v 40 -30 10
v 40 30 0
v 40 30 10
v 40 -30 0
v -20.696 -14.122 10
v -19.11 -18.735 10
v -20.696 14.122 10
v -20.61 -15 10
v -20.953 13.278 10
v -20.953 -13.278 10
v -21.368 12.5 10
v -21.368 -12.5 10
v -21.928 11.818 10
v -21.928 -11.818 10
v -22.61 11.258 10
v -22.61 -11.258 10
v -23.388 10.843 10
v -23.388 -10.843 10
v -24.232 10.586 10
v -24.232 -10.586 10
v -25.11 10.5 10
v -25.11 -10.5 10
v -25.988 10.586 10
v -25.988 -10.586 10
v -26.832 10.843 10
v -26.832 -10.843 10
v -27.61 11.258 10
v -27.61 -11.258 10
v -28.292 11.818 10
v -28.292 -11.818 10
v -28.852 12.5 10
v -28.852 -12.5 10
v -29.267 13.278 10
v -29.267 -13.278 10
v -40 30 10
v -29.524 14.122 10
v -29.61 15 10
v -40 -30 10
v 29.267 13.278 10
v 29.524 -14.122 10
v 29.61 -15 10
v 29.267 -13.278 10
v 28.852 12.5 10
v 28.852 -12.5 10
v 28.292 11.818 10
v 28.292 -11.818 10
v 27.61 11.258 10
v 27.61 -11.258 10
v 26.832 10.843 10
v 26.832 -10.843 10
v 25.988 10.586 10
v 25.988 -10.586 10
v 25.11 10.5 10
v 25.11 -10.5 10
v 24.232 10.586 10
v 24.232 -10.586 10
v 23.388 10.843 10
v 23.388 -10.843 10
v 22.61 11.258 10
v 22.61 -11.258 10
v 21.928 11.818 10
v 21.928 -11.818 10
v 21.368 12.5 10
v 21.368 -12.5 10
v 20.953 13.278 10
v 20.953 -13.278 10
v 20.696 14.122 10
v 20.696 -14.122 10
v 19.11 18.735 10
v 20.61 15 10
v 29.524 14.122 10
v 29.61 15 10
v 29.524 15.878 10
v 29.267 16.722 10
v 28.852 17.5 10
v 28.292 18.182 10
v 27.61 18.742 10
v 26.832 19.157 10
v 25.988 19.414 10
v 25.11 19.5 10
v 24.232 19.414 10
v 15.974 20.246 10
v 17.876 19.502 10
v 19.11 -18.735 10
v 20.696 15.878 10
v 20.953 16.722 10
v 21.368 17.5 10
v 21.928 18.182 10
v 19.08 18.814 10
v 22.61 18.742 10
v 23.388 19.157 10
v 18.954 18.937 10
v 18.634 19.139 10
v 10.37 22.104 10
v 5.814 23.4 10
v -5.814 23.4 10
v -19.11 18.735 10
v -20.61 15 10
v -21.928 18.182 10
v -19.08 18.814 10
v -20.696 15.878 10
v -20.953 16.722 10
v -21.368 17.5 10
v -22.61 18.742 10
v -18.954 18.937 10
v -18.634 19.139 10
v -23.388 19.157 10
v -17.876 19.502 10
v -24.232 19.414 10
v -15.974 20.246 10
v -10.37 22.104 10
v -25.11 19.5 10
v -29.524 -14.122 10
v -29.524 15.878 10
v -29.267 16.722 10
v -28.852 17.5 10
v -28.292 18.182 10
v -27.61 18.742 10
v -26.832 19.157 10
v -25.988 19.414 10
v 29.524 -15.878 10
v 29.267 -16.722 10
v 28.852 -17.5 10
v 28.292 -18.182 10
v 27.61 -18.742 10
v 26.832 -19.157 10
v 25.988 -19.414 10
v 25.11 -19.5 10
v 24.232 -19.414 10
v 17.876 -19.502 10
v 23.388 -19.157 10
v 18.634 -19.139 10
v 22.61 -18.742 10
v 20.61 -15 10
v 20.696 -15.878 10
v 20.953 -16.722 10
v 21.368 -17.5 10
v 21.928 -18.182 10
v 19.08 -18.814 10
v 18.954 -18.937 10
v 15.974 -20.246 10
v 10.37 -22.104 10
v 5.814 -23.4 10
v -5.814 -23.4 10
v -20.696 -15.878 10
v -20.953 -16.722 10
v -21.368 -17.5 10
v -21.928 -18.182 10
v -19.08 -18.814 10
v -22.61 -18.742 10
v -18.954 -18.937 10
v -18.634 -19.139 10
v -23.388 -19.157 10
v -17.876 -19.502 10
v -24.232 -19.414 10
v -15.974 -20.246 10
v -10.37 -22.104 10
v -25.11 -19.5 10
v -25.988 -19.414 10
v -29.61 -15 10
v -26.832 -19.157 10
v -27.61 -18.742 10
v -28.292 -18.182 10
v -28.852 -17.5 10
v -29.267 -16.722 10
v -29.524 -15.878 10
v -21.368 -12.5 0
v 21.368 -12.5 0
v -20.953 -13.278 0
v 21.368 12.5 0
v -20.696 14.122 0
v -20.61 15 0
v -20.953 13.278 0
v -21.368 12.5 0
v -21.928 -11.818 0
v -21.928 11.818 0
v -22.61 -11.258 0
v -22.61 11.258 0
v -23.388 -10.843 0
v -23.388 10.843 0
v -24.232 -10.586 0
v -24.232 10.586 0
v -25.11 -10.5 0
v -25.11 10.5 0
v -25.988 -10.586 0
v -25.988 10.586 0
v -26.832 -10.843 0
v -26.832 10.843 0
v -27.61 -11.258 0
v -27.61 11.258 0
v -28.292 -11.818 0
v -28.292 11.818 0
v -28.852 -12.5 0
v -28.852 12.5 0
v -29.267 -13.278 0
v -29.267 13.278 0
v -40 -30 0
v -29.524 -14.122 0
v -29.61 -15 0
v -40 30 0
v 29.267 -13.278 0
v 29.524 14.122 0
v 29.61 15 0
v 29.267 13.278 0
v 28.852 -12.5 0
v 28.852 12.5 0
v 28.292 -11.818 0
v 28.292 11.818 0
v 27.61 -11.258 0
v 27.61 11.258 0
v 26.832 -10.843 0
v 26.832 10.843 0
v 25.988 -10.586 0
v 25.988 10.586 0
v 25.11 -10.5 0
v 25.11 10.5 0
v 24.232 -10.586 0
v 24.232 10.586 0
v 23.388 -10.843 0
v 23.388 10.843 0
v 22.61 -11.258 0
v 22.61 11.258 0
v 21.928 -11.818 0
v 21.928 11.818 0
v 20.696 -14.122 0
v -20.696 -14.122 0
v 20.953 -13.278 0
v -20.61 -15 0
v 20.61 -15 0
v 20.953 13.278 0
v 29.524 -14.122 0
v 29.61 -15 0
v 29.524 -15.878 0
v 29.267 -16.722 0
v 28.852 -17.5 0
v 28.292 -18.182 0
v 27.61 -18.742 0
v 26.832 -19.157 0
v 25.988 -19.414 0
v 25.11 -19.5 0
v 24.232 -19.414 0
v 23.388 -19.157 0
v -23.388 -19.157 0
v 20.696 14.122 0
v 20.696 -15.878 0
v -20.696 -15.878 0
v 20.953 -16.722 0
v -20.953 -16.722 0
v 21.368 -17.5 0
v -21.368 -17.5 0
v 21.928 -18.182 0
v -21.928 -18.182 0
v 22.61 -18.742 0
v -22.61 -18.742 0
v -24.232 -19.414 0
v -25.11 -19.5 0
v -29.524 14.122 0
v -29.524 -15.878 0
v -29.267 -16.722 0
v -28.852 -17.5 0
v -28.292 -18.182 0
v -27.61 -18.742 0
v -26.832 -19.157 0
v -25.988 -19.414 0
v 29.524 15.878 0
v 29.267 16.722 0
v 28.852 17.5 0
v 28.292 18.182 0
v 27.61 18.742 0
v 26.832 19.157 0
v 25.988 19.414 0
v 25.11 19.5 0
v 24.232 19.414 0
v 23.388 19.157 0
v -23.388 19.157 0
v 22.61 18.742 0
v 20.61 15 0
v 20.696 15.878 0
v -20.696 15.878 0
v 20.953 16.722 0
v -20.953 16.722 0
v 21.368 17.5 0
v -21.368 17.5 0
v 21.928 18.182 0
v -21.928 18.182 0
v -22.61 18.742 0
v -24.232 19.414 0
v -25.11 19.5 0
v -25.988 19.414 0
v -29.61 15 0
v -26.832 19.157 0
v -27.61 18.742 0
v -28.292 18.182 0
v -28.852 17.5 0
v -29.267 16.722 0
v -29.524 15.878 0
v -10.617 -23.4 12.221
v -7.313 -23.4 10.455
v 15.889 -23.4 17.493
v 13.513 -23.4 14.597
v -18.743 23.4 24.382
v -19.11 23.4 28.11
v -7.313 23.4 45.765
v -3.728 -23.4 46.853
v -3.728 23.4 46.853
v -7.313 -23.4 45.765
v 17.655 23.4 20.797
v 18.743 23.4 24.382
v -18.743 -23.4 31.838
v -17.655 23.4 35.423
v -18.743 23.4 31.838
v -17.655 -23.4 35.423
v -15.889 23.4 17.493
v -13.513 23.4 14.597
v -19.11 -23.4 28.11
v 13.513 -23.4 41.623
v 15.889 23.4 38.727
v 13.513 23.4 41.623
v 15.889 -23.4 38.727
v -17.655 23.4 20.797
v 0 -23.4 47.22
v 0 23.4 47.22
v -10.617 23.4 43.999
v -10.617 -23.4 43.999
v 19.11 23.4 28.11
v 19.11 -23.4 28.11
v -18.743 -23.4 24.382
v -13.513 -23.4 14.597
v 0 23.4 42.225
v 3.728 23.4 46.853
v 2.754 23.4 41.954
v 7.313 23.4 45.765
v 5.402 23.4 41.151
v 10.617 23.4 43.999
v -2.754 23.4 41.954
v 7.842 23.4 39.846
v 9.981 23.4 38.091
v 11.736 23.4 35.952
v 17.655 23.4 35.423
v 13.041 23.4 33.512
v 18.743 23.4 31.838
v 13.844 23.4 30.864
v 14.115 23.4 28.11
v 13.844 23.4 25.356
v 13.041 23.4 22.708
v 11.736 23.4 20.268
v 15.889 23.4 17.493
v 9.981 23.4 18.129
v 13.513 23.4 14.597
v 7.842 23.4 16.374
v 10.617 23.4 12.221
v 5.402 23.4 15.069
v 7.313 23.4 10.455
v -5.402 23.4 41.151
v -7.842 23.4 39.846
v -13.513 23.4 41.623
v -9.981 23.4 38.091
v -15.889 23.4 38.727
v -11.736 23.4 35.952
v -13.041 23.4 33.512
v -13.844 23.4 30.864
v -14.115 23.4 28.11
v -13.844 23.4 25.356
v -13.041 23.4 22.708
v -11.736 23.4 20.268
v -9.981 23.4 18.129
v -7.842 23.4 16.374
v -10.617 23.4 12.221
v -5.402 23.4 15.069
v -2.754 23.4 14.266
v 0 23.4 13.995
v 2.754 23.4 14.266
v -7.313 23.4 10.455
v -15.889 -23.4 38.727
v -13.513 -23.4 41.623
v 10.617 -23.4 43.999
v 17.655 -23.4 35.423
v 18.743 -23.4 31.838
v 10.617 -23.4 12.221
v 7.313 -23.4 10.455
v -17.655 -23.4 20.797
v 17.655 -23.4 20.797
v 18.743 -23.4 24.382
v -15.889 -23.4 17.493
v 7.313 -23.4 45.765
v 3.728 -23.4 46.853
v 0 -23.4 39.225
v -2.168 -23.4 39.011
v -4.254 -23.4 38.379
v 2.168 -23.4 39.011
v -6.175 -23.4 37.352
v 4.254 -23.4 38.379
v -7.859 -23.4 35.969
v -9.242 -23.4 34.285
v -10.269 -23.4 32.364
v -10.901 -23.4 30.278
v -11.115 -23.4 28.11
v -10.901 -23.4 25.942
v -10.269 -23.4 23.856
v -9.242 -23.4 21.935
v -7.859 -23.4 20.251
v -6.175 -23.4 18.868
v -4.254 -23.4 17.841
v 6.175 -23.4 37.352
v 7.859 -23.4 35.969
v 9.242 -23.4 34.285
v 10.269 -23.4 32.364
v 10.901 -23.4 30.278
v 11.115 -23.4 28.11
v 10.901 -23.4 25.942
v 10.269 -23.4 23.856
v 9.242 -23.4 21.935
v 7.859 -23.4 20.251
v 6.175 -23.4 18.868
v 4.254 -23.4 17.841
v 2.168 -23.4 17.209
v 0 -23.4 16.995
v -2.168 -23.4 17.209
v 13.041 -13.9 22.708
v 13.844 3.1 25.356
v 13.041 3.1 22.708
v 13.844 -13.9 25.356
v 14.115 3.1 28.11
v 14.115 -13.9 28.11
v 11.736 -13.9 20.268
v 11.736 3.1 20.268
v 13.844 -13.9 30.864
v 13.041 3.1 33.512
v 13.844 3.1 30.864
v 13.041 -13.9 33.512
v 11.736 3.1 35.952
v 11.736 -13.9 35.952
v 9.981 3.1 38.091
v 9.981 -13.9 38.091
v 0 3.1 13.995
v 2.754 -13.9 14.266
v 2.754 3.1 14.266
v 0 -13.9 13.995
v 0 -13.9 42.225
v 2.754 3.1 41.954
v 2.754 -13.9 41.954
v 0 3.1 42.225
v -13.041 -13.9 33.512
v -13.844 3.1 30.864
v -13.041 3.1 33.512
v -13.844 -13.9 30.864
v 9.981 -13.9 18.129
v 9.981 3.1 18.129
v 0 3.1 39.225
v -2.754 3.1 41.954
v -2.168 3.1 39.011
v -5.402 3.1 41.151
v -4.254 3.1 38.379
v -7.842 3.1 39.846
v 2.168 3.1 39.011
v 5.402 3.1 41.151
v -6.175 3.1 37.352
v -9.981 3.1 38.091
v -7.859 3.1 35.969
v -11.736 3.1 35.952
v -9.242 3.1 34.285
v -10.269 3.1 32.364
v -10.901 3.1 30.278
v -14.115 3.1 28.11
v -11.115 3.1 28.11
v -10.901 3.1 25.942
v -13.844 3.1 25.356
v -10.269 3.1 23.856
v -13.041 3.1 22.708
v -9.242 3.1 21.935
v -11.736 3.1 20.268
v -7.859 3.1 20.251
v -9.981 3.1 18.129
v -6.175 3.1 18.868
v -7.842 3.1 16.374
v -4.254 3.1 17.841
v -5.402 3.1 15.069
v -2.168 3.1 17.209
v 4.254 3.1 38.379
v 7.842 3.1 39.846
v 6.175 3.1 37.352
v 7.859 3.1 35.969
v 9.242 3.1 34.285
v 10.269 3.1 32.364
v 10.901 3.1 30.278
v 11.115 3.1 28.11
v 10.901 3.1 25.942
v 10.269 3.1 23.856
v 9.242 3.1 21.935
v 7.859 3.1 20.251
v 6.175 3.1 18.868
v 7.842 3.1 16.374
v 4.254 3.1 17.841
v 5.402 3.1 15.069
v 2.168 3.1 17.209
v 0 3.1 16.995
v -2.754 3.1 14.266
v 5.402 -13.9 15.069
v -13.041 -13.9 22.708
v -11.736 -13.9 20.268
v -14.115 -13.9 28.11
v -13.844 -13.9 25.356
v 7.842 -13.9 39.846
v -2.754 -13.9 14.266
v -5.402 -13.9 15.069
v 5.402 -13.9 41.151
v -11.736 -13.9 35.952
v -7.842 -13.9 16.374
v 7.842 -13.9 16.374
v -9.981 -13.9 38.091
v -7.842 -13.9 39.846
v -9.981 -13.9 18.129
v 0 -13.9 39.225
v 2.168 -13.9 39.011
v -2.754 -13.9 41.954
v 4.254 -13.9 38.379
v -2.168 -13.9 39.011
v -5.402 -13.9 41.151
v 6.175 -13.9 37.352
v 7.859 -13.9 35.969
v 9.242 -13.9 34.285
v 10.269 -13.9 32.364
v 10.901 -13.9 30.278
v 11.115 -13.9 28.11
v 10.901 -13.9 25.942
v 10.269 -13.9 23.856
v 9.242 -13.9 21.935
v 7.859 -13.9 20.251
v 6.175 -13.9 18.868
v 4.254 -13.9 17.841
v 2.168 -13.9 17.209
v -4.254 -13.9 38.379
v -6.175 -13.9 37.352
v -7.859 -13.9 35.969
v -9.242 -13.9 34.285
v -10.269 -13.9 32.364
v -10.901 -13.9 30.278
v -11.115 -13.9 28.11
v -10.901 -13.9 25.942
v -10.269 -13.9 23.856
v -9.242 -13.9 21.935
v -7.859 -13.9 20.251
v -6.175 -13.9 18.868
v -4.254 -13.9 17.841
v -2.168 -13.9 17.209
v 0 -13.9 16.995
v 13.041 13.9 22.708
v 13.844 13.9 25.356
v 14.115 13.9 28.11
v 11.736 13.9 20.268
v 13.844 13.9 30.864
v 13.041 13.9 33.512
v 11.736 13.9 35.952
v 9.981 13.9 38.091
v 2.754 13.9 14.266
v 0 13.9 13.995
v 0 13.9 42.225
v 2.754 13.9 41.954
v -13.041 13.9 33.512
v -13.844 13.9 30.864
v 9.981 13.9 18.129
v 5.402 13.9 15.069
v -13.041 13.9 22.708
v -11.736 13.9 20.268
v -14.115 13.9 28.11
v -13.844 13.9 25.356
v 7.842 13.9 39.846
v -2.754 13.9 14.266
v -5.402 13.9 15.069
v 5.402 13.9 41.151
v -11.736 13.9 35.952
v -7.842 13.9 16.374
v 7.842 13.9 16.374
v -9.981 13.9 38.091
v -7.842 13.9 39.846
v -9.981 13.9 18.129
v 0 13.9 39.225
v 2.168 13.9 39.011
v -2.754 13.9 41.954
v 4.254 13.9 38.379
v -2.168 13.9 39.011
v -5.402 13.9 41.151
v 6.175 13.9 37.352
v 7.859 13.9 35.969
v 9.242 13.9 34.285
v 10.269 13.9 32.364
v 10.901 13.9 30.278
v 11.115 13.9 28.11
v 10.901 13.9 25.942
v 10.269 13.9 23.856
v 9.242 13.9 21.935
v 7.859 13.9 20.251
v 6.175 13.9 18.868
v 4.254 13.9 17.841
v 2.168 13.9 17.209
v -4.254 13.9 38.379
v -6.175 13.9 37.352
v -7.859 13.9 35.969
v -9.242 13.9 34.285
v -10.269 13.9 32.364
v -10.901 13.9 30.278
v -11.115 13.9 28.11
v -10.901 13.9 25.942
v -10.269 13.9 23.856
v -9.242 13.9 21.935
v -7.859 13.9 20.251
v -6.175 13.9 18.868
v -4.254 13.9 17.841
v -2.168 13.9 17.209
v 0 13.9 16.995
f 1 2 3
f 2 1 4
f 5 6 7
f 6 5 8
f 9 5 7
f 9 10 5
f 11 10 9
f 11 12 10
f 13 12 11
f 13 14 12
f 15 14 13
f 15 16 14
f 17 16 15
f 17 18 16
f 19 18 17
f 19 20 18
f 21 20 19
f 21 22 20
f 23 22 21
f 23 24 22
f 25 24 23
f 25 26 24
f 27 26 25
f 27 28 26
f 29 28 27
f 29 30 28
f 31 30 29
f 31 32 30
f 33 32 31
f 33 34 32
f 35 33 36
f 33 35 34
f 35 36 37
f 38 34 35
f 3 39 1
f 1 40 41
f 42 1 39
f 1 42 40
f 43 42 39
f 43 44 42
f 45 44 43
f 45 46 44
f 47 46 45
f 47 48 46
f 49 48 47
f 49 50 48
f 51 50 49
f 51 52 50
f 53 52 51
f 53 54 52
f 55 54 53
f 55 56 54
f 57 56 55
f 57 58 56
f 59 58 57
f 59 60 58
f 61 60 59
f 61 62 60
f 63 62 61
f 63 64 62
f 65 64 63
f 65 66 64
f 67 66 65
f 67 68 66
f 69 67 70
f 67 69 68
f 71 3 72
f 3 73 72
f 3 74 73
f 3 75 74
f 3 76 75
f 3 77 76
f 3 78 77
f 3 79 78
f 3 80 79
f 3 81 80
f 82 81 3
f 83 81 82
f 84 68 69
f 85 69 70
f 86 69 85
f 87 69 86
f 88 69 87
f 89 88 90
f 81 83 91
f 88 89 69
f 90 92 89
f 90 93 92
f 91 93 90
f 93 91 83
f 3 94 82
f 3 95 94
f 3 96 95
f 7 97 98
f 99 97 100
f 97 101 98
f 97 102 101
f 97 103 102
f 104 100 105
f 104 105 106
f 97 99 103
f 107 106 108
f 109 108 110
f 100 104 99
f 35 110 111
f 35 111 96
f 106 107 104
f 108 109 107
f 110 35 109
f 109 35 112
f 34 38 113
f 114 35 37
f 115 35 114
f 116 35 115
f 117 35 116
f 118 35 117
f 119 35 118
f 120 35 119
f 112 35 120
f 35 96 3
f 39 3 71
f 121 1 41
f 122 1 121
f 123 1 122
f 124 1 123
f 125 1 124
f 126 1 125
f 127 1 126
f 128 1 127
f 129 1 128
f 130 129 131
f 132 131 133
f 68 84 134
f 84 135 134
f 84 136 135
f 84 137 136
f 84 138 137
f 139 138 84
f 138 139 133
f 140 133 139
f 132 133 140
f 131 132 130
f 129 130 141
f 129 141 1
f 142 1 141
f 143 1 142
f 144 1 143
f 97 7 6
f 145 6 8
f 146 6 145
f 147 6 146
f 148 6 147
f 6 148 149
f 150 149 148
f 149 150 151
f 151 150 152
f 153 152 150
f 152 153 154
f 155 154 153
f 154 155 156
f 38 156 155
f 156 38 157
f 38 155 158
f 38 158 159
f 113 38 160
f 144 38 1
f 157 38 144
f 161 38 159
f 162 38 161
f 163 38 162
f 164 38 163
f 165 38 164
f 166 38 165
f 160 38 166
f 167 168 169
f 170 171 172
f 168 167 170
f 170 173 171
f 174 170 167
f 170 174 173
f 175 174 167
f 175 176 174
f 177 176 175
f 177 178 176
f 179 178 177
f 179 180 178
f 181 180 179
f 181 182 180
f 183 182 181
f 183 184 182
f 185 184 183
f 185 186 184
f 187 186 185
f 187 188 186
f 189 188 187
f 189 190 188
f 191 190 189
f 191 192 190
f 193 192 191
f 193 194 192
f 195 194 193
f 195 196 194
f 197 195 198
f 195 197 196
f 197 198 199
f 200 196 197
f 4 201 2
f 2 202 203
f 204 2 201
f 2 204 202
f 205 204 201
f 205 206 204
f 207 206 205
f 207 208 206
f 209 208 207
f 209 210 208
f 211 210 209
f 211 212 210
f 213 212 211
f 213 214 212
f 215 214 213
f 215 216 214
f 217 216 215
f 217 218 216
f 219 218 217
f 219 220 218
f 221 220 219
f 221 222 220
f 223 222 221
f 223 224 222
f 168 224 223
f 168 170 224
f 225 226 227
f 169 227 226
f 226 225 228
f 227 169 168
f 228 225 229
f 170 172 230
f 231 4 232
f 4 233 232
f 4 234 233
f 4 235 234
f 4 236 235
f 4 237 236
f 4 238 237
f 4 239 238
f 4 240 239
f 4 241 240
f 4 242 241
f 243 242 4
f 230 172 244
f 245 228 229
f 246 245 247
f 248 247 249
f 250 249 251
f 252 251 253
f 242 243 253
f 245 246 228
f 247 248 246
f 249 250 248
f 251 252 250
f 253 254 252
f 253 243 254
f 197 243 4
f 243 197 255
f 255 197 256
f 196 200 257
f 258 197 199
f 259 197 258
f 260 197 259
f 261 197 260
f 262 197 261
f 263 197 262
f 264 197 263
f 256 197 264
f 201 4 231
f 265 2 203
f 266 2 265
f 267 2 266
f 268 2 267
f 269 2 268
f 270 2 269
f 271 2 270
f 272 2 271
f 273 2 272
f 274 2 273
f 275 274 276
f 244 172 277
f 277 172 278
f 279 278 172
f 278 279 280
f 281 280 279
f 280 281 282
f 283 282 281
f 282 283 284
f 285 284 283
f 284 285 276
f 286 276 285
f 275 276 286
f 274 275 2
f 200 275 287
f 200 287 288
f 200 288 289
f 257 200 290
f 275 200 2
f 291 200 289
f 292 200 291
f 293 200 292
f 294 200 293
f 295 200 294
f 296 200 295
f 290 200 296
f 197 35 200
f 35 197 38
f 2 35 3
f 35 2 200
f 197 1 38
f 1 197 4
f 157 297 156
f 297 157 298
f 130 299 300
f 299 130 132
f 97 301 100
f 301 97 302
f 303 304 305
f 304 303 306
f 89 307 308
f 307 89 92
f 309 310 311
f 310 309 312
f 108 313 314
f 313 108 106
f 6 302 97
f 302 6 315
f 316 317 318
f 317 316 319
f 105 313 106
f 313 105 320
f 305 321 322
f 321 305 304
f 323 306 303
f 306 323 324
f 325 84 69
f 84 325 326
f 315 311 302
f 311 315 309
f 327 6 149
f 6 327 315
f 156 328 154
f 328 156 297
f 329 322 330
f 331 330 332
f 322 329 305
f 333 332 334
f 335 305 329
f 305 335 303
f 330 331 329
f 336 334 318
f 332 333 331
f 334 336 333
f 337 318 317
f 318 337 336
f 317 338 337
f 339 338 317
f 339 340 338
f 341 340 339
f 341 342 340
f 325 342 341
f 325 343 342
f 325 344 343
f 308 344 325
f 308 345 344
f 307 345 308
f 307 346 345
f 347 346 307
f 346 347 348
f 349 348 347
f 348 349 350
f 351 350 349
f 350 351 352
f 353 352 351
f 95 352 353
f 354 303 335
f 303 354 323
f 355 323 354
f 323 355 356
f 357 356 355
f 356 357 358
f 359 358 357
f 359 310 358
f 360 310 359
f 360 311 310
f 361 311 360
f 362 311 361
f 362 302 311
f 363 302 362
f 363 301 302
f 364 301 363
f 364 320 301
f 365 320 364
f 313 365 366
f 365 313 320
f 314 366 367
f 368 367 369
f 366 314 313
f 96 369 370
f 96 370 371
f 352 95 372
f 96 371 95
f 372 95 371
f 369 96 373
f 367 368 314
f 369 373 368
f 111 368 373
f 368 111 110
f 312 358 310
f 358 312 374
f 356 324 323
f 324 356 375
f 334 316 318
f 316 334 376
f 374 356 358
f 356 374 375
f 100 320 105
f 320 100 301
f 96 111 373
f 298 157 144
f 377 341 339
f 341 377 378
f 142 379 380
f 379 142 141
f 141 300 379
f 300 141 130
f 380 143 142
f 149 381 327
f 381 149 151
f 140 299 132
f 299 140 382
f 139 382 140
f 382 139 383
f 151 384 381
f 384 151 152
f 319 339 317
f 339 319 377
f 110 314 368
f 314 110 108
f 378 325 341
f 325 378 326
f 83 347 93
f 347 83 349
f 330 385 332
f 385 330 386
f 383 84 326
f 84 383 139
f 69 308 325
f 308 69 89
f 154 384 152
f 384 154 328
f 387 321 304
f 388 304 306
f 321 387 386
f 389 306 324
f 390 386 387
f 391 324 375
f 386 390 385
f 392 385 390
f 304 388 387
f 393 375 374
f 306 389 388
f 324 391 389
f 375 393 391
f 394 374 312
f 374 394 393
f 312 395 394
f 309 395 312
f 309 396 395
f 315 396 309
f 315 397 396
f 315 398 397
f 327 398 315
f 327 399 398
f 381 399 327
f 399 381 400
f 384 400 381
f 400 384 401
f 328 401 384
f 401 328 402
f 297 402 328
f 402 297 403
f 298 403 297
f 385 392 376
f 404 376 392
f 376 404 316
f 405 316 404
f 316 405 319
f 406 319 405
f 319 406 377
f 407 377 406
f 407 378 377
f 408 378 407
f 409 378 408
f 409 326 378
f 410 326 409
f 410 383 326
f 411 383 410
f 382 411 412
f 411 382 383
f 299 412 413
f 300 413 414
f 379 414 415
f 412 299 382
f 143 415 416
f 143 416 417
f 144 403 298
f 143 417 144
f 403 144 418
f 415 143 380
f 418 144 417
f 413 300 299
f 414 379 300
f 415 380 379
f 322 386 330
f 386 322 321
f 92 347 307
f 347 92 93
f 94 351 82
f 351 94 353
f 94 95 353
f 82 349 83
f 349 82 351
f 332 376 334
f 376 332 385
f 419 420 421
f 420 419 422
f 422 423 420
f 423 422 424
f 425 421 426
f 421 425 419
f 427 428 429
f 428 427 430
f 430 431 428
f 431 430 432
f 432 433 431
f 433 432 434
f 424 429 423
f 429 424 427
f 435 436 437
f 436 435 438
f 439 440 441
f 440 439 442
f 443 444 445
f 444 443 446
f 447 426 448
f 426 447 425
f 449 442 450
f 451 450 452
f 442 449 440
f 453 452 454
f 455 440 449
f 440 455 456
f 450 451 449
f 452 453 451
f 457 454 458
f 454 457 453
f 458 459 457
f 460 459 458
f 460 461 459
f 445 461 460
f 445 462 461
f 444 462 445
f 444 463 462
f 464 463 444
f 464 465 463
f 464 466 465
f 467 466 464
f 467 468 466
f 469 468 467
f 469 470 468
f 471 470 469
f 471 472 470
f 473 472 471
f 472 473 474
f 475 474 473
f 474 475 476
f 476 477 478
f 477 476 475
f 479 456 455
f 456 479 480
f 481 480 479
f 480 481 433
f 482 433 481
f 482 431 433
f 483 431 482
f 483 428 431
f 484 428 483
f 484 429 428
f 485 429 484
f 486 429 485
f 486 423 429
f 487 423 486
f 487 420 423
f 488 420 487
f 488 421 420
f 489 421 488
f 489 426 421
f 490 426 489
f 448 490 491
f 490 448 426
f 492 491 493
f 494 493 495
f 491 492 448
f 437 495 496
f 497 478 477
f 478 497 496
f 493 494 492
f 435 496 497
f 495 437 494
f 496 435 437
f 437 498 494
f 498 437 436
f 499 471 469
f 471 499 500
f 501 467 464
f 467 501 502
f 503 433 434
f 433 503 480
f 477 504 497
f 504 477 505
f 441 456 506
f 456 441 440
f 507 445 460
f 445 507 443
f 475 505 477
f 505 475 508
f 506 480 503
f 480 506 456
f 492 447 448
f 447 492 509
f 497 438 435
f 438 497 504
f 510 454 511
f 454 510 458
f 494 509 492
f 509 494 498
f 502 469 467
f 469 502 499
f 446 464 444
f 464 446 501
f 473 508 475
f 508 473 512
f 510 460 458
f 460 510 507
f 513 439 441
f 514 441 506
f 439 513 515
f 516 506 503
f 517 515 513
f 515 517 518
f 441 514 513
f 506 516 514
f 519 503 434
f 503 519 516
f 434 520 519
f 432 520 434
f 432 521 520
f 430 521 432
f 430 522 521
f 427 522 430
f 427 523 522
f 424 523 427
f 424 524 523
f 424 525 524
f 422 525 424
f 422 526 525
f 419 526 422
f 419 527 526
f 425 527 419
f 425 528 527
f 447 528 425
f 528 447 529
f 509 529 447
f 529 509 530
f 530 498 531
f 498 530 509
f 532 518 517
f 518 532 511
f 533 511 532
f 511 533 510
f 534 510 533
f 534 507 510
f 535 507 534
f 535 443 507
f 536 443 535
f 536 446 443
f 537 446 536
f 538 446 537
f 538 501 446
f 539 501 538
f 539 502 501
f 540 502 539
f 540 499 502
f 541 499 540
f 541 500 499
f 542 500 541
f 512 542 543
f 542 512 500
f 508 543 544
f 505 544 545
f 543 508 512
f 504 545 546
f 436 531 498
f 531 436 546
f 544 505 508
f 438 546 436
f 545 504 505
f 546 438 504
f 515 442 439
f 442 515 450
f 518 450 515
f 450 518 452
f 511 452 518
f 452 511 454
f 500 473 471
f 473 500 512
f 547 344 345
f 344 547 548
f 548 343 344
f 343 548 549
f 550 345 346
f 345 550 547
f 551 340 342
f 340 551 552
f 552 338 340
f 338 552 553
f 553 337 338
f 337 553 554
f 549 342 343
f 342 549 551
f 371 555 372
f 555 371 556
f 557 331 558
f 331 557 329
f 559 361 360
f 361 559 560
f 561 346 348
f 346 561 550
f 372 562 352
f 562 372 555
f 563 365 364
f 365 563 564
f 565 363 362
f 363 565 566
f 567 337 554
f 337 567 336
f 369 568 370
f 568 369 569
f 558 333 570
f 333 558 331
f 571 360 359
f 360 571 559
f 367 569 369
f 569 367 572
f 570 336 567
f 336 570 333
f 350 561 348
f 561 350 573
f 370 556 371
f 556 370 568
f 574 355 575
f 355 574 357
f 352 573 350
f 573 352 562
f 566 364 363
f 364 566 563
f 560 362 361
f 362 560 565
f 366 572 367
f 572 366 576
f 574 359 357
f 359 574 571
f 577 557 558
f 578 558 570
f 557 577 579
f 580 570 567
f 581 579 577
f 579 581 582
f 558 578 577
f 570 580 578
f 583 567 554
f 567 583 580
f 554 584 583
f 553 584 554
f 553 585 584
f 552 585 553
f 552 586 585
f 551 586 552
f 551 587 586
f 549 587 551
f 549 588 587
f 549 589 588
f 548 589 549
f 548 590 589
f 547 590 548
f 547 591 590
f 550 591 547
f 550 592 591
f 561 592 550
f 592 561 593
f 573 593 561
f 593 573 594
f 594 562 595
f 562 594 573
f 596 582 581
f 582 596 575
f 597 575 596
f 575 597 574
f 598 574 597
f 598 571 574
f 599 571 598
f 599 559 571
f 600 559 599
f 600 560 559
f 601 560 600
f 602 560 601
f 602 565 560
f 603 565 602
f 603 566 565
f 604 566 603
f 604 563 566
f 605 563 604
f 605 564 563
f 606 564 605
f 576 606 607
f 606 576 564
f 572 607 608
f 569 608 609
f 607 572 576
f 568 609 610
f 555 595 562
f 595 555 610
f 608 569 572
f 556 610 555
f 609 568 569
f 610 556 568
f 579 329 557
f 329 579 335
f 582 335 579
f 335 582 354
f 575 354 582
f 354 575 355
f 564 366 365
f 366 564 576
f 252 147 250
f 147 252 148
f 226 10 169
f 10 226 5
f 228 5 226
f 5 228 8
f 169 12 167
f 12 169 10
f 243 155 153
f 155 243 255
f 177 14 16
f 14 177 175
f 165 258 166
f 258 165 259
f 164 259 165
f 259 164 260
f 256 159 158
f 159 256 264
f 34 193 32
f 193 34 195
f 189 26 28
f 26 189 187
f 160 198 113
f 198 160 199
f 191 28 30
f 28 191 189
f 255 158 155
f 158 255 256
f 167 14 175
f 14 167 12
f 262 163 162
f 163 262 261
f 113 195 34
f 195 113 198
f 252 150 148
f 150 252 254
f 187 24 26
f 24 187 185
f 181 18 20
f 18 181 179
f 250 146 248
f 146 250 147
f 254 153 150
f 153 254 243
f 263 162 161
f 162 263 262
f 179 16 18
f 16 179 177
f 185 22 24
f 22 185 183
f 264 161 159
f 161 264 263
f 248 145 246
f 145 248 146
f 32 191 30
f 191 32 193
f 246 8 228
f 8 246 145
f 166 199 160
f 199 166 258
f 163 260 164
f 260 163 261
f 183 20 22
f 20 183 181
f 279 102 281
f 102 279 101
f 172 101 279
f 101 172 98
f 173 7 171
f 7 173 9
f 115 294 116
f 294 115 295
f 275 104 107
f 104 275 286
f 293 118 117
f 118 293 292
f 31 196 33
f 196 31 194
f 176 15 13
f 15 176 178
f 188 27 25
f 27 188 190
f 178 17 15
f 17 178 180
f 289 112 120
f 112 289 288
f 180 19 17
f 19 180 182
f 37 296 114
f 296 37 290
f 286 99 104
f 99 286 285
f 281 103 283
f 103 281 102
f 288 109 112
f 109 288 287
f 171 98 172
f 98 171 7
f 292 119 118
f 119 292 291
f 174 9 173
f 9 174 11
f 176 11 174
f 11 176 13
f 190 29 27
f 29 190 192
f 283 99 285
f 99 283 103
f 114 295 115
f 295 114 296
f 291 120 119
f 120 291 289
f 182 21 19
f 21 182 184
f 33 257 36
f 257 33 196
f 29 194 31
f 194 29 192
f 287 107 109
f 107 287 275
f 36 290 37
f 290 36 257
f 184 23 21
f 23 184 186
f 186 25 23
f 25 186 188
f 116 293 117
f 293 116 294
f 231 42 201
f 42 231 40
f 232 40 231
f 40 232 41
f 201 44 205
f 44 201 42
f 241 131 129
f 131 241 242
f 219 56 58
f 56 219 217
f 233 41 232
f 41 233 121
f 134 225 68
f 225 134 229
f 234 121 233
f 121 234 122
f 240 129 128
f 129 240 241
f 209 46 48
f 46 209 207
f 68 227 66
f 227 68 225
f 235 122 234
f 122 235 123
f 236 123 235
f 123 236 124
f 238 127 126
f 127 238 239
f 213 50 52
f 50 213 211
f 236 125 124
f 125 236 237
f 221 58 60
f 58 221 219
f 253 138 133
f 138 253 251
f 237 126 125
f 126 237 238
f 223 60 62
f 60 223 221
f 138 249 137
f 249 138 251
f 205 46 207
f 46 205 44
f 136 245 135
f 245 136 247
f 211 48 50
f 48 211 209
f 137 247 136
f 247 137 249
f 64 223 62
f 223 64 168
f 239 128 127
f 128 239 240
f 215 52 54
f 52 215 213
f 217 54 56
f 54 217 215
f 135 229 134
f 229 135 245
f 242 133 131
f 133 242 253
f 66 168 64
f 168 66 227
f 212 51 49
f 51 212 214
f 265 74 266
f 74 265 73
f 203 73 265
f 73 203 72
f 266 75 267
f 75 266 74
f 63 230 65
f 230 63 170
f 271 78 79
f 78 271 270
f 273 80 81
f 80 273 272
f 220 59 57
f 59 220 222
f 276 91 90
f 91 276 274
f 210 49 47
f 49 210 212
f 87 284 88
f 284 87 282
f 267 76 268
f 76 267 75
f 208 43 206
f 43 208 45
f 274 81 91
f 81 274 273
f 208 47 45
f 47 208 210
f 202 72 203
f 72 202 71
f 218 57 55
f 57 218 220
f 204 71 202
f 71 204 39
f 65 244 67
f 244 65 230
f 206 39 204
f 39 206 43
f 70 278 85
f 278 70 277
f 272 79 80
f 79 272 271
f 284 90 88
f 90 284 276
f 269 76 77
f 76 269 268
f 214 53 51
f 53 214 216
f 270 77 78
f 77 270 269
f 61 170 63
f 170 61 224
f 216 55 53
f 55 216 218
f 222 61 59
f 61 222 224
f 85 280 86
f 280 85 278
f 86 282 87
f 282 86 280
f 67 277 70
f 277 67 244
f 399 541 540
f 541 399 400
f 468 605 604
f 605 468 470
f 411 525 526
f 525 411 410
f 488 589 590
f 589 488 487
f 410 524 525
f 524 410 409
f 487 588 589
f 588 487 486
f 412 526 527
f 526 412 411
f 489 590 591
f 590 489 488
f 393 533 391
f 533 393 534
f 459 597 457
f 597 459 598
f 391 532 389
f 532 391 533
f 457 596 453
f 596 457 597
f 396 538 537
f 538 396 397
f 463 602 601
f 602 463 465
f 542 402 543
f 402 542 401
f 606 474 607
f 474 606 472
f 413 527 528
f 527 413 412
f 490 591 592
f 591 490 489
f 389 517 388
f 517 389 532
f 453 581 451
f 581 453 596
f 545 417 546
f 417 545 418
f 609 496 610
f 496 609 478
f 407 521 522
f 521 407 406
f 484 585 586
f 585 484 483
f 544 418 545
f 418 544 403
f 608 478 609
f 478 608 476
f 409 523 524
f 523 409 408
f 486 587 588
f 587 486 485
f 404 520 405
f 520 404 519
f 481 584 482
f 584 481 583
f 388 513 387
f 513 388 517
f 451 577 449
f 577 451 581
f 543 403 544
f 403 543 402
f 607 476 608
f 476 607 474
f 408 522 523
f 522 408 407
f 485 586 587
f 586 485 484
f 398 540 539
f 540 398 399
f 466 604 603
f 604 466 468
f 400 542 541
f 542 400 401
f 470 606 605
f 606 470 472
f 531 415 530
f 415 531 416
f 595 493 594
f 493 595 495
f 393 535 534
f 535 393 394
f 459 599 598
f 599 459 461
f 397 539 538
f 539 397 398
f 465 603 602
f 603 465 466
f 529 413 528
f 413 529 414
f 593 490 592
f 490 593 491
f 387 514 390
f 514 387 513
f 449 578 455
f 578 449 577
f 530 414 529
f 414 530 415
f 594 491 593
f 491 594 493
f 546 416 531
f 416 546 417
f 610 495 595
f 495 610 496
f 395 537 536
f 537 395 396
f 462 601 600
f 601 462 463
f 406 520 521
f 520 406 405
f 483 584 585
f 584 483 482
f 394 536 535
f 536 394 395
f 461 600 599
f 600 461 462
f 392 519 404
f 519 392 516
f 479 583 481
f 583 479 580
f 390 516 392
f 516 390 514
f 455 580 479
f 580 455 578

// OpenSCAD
$fn = 32;

// ----------------------------------------------------------------------
// Bearing block: 80 x 60 mm base, 22.23 mm bore at 28.11 mm
// ----------------------------------------------------------------------

// --- parameters (mm) ---
base_w = 80;              // base width
base_d = 60;              // base depth
base_t = 10;              // base thickness
bore_d = 22.23;           // shaft / bearing bore
house_r = 19.11;          // housing outer radius
house_len = 46.8;         // housing length along the shaft
foot_w = 38.22;           // foot width under the housing
foot_len = 36.8;          // foot length along the shaft
axis_z = 28.11;           // bore axis height above the base
holes_d = 9;              // mounting holes
hole_x = 25.11;           // mounting hole spacing
seat_d = 12;              // bearing seat depth
seat_wall = 3;            // seat wall thickness

difference() {
  union() {
    /* base plate with its underside on z = 0 */
    translate([0, 0, base_t / 2]) cube([base_w, base_d, base_t], center = true);
    /* hull foot: a straight web blending into the round housing */
    hull() {
      translate([0, 0, base_t - 0.5]) cube([foot_w, foot_len, 1.6], center = true);
      translate([0, 0, axis_z]) rotate([-90, 0, 0]) cylinder(h = house_len, d = 2 * house_r, center = true);
    }
  }
  /* bore through the housing, 2.5 mm clear on both sides */
  translate([0, 0, axis_z]) rotate([-90, 0, 0]) cylinder(h = house_len + 5, d = bore_d, center = true);
  /* bearing seats, recessed into both ends of the housing */
  for (sy = [-1, 1]) {
    translate([0, sy * (house_len / 2 - seat_d + 2.5), axis_z]) rotate([-90, 0, 0]) cylinder(h = seat_d + 5, d = bore_d + 2 * seat_wall);
  }
  /* mounting holes through the base plate */
  for (hx = [-25.11, 25.11]) {
    for (hy = [-15, 15]) {
      translate([hx, hy, -2.5]) cylinder(h = base_t + 5, d = holes_d);
    }
  }
}
